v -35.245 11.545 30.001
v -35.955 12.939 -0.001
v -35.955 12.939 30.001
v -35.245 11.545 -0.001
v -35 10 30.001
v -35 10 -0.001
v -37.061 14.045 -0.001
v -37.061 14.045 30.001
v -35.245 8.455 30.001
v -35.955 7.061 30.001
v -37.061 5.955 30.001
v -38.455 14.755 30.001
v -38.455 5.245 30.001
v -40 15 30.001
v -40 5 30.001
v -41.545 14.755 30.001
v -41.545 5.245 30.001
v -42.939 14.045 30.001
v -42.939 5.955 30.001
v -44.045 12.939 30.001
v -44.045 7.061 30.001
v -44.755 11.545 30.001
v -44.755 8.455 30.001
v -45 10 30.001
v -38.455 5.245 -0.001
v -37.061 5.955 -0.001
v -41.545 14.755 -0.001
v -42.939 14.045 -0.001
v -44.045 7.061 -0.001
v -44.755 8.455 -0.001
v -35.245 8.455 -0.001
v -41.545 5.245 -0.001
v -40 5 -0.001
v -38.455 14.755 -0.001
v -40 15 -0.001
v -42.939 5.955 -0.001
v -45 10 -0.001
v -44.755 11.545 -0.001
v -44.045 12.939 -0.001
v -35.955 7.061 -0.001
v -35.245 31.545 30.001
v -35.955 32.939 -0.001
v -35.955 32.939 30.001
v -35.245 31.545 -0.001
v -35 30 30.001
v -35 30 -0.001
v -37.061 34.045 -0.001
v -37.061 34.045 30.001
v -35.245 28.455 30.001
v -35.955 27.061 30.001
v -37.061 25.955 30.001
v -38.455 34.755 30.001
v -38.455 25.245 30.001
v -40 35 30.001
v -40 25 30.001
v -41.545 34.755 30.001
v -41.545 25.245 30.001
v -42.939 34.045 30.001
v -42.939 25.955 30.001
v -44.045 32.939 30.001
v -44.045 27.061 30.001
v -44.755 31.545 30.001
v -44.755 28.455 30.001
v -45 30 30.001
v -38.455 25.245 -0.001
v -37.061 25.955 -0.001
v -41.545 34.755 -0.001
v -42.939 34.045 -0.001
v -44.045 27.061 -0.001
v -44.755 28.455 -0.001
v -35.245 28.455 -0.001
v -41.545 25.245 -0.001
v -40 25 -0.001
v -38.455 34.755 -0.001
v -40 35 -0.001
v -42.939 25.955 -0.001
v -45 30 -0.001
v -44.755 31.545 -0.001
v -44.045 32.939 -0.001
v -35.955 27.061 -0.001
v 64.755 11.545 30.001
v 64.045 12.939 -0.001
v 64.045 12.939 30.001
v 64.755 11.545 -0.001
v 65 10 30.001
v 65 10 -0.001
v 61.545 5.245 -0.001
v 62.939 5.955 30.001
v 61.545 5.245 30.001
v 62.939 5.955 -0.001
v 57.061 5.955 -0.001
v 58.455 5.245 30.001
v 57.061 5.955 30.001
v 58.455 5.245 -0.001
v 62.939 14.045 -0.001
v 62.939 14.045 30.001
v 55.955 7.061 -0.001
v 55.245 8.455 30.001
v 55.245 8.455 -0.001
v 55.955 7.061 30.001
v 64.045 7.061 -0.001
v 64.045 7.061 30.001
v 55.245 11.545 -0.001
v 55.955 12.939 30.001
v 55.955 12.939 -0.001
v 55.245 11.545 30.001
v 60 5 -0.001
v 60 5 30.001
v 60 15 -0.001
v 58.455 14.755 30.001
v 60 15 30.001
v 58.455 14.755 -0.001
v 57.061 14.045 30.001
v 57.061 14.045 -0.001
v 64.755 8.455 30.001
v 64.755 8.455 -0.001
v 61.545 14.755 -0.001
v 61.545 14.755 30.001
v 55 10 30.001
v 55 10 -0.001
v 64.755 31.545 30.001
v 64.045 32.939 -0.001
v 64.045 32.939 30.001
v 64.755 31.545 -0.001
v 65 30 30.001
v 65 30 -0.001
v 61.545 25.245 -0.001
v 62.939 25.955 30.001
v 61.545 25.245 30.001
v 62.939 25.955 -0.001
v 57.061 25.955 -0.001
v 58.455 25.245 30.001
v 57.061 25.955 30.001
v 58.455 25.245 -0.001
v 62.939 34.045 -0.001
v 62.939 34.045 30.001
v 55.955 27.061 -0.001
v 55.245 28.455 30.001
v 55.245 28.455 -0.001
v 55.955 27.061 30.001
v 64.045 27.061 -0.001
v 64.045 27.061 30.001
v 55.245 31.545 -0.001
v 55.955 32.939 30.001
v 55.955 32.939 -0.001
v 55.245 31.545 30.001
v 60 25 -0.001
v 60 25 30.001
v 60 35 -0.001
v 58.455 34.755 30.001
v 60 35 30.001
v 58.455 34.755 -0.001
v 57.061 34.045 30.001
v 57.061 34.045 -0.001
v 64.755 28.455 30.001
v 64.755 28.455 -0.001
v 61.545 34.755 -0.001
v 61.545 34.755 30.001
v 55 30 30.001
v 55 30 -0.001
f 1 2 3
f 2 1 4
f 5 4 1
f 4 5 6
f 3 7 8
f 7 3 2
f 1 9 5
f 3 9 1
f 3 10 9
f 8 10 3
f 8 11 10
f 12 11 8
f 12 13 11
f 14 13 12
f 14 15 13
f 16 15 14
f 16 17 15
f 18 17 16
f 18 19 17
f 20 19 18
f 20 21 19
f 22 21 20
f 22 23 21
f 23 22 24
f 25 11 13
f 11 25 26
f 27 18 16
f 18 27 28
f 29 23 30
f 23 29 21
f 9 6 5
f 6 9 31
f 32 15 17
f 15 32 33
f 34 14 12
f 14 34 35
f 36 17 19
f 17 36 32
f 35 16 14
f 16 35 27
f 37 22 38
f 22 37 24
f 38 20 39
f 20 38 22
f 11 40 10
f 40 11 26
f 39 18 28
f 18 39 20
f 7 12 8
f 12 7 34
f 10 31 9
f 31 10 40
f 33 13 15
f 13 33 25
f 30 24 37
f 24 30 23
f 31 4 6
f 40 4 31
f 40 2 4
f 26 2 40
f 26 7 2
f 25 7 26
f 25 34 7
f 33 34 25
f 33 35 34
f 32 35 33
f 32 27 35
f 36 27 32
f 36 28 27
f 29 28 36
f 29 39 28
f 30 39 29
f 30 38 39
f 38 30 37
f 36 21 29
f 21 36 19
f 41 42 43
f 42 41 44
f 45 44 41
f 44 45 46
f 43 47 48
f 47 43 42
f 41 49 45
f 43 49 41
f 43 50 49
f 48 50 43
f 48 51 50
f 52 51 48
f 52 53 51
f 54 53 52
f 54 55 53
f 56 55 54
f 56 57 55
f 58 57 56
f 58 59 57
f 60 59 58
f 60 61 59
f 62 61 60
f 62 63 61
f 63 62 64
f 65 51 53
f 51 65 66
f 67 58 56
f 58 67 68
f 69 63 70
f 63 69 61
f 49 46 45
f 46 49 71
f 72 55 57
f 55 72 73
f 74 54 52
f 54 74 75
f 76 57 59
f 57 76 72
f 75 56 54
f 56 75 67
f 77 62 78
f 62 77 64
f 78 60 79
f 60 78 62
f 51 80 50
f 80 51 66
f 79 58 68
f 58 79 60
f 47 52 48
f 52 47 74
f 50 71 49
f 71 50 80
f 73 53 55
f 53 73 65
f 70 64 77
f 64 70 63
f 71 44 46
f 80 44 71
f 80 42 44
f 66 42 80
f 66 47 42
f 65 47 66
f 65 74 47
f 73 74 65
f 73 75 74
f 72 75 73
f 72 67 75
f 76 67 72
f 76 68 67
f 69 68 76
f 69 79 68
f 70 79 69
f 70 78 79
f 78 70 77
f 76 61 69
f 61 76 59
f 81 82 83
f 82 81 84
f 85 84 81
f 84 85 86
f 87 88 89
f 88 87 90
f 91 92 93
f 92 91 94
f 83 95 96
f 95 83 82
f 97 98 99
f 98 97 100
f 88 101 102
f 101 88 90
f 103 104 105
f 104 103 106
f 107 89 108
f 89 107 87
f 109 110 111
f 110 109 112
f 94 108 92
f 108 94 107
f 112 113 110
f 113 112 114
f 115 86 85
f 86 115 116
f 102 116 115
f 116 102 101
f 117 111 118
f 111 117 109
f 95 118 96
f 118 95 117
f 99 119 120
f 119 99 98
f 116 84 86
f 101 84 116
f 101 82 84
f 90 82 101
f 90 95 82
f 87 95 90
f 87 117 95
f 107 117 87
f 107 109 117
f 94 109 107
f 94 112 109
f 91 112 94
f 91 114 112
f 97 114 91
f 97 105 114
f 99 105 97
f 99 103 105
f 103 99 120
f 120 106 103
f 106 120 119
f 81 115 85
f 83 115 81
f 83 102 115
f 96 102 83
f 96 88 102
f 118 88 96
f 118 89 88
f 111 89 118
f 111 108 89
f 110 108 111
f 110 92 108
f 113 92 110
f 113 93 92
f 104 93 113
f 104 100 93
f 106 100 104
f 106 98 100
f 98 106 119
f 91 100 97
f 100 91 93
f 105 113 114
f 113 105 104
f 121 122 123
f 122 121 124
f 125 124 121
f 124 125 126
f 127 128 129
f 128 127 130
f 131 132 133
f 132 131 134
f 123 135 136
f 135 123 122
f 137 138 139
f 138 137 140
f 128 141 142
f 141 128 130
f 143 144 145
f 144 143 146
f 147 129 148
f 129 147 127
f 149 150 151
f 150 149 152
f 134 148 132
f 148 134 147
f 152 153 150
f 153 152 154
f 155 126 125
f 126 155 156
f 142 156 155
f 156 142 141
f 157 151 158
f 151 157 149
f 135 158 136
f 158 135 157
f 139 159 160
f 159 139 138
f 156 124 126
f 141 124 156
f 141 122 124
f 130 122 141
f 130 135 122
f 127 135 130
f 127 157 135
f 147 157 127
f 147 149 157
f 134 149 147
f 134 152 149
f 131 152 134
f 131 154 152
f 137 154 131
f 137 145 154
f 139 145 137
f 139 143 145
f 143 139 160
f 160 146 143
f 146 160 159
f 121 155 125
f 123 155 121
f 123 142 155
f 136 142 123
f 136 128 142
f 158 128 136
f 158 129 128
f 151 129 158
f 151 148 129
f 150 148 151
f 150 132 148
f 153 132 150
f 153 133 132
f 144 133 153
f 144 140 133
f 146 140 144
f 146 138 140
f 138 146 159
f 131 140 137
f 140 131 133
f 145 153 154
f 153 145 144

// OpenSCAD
mountingHoles(10,30,100,20,10,20);
module mountingHoles(dia=3,depth=10,xCtrs=50,yCtrs=25,xOffset=0,yOffset=0){
    for (i=[-1:2:1],j=[-1:2:1]){
        translate([xOffset+i*xCtrs/2,yOffset+j*yCtrs/2,-0.001]) cylinder(d=dia,h=depth+0.002,$fn=20);
    }  
}
